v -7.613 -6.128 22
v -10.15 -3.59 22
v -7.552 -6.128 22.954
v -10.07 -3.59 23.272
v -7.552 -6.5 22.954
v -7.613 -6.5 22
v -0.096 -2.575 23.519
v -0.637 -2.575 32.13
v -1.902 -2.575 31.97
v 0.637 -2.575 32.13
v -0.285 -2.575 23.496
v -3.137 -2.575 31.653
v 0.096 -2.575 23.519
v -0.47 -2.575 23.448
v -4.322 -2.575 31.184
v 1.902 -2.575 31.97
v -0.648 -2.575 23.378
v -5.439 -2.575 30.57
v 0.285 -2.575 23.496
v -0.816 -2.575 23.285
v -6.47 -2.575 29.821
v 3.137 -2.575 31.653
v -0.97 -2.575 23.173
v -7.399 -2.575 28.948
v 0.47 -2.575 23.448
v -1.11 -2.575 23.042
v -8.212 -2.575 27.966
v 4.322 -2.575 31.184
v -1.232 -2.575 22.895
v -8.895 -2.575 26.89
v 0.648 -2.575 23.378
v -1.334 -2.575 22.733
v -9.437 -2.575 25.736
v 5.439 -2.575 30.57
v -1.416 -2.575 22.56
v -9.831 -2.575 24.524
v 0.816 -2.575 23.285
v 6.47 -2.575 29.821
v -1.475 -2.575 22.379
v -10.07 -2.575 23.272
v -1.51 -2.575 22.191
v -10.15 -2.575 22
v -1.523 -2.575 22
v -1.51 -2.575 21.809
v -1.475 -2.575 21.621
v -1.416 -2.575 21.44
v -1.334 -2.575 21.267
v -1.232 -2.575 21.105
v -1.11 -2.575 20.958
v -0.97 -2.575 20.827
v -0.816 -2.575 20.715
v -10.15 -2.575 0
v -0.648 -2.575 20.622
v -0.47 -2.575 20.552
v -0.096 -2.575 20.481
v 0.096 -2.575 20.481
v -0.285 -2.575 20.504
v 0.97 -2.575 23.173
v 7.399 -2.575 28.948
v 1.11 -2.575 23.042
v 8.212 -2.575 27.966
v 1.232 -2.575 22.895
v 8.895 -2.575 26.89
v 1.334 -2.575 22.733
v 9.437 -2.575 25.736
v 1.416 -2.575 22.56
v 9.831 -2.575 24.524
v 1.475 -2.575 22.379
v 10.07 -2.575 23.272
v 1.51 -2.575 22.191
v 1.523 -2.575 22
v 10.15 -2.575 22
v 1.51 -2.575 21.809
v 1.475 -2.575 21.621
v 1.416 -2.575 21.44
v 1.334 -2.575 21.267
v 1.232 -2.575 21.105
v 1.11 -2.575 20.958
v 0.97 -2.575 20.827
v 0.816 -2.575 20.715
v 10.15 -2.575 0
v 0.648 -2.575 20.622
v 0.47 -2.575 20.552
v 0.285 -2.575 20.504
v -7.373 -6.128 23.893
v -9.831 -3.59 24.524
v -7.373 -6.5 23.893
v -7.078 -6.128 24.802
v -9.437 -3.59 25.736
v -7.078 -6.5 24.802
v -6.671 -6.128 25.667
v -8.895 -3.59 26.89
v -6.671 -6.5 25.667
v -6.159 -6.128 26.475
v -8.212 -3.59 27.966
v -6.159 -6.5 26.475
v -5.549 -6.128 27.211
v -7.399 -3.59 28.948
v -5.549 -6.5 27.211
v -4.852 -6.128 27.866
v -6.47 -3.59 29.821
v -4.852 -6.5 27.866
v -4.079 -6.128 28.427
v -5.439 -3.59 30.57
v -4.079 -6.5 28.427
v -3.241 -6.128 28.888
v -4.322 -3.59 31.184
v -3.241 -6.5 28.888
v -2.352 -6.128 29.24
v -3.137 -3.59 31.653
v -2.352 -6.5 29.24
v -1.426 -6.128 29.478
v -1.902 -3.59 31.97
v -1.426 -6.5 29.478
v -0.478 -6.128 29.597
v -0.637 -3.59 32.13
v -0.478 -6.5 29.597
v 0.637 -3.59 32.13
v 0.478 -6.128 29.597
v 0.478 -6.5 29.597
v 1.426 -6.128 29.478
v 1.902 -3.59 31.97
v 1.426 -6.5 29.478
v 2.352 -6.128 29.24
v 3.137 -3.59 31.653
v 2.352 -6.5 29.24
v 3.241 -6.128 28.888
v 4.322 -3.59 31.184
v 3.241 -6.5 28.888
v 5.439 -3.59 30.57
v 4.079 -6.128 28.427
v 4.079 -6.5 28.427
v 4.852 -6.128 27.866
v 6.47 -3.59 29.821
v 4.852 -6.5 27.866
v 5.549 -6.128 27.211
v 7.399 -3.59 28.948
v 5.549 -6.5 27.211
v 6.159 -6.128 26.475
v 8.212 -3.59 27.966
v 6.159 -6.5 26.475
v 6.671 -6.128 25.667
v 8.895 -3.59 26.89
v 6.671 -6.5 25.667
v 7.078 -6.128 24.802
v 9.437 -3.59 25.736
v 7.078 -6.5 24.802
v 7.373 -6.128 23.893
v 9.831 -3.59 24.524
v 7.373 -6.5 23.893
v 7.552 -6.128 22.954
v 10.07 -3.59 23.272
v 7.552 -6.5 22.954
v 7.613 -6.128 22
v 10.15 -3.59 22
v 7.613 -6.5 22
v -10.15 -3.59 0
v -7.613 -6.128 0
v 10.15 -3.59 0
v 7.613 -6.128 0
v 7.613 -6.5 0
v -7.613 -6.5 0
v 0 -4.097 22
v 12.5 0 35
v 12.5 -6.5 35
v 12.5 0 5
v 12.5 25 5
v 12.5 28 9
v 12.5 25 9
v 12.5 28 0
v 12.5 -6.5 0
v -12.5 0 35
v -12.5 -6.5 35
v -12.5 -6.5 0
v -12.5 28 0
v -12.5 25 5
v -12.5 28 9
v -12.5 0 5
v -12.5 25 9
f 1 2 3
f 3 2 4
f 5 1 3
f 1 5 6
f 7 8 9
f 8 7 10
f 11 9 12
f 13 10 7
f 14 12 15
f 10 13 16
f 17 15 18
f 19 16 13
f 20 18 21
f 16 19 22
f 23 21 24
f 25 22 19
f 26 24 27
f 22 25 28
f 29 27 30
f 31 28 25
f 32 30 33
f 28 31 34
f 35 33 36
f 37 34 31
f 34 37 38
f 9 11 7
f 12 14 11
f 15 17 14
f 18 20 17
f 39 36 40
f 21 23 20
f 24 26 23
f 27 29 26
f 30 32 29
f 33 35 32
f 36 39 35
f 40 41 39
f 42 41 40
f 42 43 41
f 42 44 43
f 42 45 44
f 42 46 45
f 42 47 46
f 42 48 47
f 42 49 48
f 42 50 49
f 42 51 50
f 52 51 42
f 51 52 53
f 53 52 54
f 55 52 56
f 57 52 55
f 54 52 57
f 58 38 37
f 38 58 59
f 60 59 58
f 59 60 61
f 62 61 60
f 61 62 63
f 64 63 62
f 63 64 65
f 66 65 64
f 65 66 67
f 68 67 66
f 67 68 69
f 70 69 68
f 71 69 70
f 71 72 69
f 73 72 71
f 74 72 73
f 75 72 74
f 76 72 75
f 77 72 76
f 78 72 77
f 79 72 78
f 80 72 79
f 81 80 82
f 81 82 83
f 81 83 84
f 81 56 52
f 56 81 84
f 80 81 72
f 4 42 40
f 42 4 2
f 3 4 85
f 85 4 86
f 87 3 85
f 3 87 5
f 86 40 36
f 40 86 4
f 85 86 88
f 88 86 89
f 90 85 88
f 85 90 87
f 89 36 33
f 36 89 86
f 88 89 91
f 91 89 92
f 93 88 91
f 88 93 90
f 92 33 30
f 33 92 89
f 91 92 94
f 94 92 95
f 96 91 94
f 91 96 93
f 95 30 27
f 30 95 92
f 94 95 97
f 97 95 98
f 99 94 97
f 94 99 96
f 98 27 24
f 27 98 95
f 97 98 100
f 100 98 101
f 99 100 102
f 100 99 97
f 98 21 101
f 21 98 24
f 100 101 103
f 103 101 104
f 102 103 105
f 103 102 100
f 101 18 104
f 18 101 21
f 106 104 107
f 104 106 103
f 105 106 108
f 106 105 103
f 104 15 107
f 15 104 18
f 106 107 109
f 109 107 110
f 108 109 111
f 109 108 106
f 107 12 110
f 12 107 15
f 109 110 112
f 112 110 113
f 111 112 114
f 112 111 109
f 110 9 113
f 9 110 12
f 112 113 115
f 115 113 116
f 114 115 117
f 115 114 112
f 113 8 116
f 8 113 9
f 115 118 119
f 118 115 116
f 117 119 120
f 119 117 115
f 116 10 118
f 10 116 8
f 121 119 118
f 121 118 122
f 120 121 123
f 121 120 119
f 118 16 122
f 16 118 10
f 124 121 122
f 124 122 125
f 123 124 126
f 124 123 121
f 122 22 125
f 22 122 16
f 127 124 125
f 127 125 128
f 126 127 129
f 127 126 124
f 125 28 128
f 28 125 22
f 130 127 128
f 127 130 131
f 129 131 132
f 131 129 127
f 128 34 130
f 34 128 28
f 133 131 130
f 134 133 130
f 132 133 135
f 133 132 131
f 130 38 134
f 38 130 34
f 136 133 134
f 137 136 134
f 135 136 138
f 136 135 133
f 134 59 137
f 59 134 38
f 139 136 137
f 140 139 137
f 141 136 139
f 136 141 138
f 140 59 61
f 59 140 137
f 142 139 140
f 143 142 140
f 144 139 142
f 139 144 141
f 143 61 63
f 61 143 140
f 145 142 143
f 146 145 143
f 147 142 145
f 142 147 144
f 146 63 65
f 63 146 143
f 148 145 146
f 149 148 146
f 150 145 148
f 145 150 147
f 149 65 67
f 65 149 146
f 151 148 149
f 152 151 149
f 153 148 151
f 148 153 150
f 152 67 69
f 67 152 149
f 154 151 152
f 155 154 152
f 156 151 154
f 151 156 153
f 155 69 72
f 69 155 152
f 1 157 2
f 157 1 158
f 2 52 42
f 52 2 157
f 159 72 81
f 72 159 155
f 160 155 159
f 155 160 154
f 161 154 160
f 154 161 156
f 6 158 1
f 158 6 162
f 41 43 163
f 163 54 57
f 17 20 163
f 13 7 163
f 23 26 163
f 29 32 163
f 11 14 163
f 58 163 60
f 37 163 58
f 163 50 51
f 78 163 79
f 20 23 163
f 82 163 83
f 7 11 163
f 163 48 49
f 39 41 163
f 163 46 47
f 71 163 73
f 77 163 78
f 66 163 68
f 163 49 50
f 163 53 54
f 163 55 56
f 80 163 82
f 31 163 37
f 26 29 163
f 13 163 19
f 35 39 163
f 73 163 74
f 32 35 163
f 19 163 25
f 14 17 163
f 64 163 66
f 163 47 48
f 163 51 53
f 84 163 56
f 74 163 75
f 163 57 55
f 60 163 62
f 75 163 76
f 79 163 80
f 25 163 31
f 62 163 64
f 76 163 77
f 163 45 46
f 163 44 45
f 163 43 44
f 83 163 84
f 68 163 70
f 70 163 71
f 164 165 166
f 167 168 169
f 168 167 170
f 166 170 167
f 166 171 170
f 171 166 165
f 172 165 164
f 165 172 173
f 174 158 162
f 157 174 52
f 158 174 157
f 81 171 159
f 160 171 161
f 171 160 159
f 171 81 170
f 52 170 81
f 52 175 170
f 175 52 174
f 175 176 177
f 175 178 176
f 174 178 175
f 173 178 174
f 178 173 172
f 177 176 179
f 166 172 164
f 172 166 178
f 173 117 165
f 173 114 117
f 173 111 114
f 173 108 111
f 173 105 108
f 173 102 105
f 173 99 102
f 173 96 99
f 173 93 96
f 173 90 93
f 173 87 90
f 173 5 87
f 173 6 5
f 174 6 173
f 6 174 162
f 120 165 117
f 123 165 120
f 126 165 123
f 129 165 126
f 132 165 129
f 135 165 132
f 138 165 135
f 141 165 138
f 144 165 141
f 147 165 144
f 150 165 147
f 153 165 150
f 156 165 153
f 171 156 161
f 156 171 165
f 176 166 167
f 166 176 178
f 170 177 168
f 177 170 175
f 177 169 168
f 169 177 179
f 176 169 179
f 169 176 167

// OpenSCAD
/*Created by Andy Levesque
Credit to @David D on Printables and Jonathan at Keep Making for Multiconnect and Multiboard, respectively
Licensed Creative Commons 4.0 Attribution Non-Commercial Sharable with Attribution
*/

/* [Standard Parameters] */
hookWidth = 25;
hookInternalDepth = 25;
hookLipHeight = 4;

/*[Additional Customization]*/
hookLipThickness = 3;
hookBottomThickness = 5;
backHeight = 35;

/* [Slot Customization] */
//Distance between Multiconnect slots on the back (25mm is standard for MultiBoard)
distanceBetweenSlots = 25;
//QuickRelease removes the small indent in the top of the slots that lock the part into place
slotQuickRelease = false;
//Dimple scale tweaks the size of the dimple in the slot for printers that need a larger dimple to print correctly
dimpleScale = 1; //[0.5:.05:1.5]
//Scale of slots in the back (1.015 scale is default per MultiConnect specs)
slotTolerance = 1.015; //[1.0:0.005:1.025]

/*[Hidden]*/
//Thickness of the back of the item (default in 6.5mm). Changes are untested. 
backThickness = 6.5; //.1
//slot count calculates how many slots can fit on the back. Based on internal width for buffer.
slotCount = floor(max(distanceBetweenSlots,hookWidth)/distanceBetweenSlots);
echo(str("Slot Count: ",slotCount));
backWidth = max(distanceBetweenSlots,hookWidth);

//Hook
union(){
    //back
    translate(v = [-backWidth/2,0,0]) 
        back(backWidth = backWidth, backHeight = backHeight);
    //hook base
    translate(v = [-hookWidth/2,0,0]) 
        cube(size = [hookWidth,hookInternalDepth+hookLipThickness,hookBottomThickness]);
    //hook lip
    translate(v = [-hookWidth/2,hookInternalDepth,0]) 
        cube(size = [hookWidth,hookLipThickness,hookLipHeight+hookBottomThickness]);
}

//Slotted back
module back(backWidth, backHeight)
{

    difference() {
        translate(v = [0,-backThickness,0]) cube(size = [backWidth,backThickness,backHeight]);
        //Loop through slots and center on the item
        //Note: I kept doing math until it looked right. It's possible this can be simplified.
        for (slotNum = [0:1:slotCount-1]) {
            translate(v = [distanceBetweenSlots/2+(backWidth/distanceBetweenSlots-slotCount)*distanceBetweenSlots/2+slotNum*distanceBetweenSlots,-2.575,backHeight-13]) {
                color(c = "red")  slotTool(backHeight);
            }
        }
    }
}
//Create Slot Tool
module slotTool(productHeight) {
    //translate(v = [0,-0.075,0]) //removed for redundancy
    scale(v = slotTolerance) //scale for 0.15mm tolerance per Multiconnect design specs
    difference() {
        union() {
            //round top
            rotate(a = [90,0,0,]) 
                rotate_extrude($fn=50) 
                    polygon(points = [[0,0],[10,0],[10,1],[7.5,3.5],[7.5,4],[0,4]]);
            //long slot
            translate(v = [0,0,0]) 
                rotate(a = [180,0,0]) 
                linear_extrude(height = productHeight+1) 
                    union(){
                        polygon(points = [[0,0],[10,0],[10,1],[7.5,3.5],[7.5,4],[0,4]]);
                        mirror([1,0,0])
                            polygon(points = [[0,0],[10,0],[10,1],[7.5,3.5],[7.5,4],[0,4]]);
                    }
        }
        //dimple
        if (slotQuickRelease == false)
            scale(v = dimpleScale) 
            rotate(a = [90,0,0,]) 
                rotate_extrude($fn=50) 
                    polygon(points = [[0,0],[0,1.5],[1.5,0]]);
    }
}
